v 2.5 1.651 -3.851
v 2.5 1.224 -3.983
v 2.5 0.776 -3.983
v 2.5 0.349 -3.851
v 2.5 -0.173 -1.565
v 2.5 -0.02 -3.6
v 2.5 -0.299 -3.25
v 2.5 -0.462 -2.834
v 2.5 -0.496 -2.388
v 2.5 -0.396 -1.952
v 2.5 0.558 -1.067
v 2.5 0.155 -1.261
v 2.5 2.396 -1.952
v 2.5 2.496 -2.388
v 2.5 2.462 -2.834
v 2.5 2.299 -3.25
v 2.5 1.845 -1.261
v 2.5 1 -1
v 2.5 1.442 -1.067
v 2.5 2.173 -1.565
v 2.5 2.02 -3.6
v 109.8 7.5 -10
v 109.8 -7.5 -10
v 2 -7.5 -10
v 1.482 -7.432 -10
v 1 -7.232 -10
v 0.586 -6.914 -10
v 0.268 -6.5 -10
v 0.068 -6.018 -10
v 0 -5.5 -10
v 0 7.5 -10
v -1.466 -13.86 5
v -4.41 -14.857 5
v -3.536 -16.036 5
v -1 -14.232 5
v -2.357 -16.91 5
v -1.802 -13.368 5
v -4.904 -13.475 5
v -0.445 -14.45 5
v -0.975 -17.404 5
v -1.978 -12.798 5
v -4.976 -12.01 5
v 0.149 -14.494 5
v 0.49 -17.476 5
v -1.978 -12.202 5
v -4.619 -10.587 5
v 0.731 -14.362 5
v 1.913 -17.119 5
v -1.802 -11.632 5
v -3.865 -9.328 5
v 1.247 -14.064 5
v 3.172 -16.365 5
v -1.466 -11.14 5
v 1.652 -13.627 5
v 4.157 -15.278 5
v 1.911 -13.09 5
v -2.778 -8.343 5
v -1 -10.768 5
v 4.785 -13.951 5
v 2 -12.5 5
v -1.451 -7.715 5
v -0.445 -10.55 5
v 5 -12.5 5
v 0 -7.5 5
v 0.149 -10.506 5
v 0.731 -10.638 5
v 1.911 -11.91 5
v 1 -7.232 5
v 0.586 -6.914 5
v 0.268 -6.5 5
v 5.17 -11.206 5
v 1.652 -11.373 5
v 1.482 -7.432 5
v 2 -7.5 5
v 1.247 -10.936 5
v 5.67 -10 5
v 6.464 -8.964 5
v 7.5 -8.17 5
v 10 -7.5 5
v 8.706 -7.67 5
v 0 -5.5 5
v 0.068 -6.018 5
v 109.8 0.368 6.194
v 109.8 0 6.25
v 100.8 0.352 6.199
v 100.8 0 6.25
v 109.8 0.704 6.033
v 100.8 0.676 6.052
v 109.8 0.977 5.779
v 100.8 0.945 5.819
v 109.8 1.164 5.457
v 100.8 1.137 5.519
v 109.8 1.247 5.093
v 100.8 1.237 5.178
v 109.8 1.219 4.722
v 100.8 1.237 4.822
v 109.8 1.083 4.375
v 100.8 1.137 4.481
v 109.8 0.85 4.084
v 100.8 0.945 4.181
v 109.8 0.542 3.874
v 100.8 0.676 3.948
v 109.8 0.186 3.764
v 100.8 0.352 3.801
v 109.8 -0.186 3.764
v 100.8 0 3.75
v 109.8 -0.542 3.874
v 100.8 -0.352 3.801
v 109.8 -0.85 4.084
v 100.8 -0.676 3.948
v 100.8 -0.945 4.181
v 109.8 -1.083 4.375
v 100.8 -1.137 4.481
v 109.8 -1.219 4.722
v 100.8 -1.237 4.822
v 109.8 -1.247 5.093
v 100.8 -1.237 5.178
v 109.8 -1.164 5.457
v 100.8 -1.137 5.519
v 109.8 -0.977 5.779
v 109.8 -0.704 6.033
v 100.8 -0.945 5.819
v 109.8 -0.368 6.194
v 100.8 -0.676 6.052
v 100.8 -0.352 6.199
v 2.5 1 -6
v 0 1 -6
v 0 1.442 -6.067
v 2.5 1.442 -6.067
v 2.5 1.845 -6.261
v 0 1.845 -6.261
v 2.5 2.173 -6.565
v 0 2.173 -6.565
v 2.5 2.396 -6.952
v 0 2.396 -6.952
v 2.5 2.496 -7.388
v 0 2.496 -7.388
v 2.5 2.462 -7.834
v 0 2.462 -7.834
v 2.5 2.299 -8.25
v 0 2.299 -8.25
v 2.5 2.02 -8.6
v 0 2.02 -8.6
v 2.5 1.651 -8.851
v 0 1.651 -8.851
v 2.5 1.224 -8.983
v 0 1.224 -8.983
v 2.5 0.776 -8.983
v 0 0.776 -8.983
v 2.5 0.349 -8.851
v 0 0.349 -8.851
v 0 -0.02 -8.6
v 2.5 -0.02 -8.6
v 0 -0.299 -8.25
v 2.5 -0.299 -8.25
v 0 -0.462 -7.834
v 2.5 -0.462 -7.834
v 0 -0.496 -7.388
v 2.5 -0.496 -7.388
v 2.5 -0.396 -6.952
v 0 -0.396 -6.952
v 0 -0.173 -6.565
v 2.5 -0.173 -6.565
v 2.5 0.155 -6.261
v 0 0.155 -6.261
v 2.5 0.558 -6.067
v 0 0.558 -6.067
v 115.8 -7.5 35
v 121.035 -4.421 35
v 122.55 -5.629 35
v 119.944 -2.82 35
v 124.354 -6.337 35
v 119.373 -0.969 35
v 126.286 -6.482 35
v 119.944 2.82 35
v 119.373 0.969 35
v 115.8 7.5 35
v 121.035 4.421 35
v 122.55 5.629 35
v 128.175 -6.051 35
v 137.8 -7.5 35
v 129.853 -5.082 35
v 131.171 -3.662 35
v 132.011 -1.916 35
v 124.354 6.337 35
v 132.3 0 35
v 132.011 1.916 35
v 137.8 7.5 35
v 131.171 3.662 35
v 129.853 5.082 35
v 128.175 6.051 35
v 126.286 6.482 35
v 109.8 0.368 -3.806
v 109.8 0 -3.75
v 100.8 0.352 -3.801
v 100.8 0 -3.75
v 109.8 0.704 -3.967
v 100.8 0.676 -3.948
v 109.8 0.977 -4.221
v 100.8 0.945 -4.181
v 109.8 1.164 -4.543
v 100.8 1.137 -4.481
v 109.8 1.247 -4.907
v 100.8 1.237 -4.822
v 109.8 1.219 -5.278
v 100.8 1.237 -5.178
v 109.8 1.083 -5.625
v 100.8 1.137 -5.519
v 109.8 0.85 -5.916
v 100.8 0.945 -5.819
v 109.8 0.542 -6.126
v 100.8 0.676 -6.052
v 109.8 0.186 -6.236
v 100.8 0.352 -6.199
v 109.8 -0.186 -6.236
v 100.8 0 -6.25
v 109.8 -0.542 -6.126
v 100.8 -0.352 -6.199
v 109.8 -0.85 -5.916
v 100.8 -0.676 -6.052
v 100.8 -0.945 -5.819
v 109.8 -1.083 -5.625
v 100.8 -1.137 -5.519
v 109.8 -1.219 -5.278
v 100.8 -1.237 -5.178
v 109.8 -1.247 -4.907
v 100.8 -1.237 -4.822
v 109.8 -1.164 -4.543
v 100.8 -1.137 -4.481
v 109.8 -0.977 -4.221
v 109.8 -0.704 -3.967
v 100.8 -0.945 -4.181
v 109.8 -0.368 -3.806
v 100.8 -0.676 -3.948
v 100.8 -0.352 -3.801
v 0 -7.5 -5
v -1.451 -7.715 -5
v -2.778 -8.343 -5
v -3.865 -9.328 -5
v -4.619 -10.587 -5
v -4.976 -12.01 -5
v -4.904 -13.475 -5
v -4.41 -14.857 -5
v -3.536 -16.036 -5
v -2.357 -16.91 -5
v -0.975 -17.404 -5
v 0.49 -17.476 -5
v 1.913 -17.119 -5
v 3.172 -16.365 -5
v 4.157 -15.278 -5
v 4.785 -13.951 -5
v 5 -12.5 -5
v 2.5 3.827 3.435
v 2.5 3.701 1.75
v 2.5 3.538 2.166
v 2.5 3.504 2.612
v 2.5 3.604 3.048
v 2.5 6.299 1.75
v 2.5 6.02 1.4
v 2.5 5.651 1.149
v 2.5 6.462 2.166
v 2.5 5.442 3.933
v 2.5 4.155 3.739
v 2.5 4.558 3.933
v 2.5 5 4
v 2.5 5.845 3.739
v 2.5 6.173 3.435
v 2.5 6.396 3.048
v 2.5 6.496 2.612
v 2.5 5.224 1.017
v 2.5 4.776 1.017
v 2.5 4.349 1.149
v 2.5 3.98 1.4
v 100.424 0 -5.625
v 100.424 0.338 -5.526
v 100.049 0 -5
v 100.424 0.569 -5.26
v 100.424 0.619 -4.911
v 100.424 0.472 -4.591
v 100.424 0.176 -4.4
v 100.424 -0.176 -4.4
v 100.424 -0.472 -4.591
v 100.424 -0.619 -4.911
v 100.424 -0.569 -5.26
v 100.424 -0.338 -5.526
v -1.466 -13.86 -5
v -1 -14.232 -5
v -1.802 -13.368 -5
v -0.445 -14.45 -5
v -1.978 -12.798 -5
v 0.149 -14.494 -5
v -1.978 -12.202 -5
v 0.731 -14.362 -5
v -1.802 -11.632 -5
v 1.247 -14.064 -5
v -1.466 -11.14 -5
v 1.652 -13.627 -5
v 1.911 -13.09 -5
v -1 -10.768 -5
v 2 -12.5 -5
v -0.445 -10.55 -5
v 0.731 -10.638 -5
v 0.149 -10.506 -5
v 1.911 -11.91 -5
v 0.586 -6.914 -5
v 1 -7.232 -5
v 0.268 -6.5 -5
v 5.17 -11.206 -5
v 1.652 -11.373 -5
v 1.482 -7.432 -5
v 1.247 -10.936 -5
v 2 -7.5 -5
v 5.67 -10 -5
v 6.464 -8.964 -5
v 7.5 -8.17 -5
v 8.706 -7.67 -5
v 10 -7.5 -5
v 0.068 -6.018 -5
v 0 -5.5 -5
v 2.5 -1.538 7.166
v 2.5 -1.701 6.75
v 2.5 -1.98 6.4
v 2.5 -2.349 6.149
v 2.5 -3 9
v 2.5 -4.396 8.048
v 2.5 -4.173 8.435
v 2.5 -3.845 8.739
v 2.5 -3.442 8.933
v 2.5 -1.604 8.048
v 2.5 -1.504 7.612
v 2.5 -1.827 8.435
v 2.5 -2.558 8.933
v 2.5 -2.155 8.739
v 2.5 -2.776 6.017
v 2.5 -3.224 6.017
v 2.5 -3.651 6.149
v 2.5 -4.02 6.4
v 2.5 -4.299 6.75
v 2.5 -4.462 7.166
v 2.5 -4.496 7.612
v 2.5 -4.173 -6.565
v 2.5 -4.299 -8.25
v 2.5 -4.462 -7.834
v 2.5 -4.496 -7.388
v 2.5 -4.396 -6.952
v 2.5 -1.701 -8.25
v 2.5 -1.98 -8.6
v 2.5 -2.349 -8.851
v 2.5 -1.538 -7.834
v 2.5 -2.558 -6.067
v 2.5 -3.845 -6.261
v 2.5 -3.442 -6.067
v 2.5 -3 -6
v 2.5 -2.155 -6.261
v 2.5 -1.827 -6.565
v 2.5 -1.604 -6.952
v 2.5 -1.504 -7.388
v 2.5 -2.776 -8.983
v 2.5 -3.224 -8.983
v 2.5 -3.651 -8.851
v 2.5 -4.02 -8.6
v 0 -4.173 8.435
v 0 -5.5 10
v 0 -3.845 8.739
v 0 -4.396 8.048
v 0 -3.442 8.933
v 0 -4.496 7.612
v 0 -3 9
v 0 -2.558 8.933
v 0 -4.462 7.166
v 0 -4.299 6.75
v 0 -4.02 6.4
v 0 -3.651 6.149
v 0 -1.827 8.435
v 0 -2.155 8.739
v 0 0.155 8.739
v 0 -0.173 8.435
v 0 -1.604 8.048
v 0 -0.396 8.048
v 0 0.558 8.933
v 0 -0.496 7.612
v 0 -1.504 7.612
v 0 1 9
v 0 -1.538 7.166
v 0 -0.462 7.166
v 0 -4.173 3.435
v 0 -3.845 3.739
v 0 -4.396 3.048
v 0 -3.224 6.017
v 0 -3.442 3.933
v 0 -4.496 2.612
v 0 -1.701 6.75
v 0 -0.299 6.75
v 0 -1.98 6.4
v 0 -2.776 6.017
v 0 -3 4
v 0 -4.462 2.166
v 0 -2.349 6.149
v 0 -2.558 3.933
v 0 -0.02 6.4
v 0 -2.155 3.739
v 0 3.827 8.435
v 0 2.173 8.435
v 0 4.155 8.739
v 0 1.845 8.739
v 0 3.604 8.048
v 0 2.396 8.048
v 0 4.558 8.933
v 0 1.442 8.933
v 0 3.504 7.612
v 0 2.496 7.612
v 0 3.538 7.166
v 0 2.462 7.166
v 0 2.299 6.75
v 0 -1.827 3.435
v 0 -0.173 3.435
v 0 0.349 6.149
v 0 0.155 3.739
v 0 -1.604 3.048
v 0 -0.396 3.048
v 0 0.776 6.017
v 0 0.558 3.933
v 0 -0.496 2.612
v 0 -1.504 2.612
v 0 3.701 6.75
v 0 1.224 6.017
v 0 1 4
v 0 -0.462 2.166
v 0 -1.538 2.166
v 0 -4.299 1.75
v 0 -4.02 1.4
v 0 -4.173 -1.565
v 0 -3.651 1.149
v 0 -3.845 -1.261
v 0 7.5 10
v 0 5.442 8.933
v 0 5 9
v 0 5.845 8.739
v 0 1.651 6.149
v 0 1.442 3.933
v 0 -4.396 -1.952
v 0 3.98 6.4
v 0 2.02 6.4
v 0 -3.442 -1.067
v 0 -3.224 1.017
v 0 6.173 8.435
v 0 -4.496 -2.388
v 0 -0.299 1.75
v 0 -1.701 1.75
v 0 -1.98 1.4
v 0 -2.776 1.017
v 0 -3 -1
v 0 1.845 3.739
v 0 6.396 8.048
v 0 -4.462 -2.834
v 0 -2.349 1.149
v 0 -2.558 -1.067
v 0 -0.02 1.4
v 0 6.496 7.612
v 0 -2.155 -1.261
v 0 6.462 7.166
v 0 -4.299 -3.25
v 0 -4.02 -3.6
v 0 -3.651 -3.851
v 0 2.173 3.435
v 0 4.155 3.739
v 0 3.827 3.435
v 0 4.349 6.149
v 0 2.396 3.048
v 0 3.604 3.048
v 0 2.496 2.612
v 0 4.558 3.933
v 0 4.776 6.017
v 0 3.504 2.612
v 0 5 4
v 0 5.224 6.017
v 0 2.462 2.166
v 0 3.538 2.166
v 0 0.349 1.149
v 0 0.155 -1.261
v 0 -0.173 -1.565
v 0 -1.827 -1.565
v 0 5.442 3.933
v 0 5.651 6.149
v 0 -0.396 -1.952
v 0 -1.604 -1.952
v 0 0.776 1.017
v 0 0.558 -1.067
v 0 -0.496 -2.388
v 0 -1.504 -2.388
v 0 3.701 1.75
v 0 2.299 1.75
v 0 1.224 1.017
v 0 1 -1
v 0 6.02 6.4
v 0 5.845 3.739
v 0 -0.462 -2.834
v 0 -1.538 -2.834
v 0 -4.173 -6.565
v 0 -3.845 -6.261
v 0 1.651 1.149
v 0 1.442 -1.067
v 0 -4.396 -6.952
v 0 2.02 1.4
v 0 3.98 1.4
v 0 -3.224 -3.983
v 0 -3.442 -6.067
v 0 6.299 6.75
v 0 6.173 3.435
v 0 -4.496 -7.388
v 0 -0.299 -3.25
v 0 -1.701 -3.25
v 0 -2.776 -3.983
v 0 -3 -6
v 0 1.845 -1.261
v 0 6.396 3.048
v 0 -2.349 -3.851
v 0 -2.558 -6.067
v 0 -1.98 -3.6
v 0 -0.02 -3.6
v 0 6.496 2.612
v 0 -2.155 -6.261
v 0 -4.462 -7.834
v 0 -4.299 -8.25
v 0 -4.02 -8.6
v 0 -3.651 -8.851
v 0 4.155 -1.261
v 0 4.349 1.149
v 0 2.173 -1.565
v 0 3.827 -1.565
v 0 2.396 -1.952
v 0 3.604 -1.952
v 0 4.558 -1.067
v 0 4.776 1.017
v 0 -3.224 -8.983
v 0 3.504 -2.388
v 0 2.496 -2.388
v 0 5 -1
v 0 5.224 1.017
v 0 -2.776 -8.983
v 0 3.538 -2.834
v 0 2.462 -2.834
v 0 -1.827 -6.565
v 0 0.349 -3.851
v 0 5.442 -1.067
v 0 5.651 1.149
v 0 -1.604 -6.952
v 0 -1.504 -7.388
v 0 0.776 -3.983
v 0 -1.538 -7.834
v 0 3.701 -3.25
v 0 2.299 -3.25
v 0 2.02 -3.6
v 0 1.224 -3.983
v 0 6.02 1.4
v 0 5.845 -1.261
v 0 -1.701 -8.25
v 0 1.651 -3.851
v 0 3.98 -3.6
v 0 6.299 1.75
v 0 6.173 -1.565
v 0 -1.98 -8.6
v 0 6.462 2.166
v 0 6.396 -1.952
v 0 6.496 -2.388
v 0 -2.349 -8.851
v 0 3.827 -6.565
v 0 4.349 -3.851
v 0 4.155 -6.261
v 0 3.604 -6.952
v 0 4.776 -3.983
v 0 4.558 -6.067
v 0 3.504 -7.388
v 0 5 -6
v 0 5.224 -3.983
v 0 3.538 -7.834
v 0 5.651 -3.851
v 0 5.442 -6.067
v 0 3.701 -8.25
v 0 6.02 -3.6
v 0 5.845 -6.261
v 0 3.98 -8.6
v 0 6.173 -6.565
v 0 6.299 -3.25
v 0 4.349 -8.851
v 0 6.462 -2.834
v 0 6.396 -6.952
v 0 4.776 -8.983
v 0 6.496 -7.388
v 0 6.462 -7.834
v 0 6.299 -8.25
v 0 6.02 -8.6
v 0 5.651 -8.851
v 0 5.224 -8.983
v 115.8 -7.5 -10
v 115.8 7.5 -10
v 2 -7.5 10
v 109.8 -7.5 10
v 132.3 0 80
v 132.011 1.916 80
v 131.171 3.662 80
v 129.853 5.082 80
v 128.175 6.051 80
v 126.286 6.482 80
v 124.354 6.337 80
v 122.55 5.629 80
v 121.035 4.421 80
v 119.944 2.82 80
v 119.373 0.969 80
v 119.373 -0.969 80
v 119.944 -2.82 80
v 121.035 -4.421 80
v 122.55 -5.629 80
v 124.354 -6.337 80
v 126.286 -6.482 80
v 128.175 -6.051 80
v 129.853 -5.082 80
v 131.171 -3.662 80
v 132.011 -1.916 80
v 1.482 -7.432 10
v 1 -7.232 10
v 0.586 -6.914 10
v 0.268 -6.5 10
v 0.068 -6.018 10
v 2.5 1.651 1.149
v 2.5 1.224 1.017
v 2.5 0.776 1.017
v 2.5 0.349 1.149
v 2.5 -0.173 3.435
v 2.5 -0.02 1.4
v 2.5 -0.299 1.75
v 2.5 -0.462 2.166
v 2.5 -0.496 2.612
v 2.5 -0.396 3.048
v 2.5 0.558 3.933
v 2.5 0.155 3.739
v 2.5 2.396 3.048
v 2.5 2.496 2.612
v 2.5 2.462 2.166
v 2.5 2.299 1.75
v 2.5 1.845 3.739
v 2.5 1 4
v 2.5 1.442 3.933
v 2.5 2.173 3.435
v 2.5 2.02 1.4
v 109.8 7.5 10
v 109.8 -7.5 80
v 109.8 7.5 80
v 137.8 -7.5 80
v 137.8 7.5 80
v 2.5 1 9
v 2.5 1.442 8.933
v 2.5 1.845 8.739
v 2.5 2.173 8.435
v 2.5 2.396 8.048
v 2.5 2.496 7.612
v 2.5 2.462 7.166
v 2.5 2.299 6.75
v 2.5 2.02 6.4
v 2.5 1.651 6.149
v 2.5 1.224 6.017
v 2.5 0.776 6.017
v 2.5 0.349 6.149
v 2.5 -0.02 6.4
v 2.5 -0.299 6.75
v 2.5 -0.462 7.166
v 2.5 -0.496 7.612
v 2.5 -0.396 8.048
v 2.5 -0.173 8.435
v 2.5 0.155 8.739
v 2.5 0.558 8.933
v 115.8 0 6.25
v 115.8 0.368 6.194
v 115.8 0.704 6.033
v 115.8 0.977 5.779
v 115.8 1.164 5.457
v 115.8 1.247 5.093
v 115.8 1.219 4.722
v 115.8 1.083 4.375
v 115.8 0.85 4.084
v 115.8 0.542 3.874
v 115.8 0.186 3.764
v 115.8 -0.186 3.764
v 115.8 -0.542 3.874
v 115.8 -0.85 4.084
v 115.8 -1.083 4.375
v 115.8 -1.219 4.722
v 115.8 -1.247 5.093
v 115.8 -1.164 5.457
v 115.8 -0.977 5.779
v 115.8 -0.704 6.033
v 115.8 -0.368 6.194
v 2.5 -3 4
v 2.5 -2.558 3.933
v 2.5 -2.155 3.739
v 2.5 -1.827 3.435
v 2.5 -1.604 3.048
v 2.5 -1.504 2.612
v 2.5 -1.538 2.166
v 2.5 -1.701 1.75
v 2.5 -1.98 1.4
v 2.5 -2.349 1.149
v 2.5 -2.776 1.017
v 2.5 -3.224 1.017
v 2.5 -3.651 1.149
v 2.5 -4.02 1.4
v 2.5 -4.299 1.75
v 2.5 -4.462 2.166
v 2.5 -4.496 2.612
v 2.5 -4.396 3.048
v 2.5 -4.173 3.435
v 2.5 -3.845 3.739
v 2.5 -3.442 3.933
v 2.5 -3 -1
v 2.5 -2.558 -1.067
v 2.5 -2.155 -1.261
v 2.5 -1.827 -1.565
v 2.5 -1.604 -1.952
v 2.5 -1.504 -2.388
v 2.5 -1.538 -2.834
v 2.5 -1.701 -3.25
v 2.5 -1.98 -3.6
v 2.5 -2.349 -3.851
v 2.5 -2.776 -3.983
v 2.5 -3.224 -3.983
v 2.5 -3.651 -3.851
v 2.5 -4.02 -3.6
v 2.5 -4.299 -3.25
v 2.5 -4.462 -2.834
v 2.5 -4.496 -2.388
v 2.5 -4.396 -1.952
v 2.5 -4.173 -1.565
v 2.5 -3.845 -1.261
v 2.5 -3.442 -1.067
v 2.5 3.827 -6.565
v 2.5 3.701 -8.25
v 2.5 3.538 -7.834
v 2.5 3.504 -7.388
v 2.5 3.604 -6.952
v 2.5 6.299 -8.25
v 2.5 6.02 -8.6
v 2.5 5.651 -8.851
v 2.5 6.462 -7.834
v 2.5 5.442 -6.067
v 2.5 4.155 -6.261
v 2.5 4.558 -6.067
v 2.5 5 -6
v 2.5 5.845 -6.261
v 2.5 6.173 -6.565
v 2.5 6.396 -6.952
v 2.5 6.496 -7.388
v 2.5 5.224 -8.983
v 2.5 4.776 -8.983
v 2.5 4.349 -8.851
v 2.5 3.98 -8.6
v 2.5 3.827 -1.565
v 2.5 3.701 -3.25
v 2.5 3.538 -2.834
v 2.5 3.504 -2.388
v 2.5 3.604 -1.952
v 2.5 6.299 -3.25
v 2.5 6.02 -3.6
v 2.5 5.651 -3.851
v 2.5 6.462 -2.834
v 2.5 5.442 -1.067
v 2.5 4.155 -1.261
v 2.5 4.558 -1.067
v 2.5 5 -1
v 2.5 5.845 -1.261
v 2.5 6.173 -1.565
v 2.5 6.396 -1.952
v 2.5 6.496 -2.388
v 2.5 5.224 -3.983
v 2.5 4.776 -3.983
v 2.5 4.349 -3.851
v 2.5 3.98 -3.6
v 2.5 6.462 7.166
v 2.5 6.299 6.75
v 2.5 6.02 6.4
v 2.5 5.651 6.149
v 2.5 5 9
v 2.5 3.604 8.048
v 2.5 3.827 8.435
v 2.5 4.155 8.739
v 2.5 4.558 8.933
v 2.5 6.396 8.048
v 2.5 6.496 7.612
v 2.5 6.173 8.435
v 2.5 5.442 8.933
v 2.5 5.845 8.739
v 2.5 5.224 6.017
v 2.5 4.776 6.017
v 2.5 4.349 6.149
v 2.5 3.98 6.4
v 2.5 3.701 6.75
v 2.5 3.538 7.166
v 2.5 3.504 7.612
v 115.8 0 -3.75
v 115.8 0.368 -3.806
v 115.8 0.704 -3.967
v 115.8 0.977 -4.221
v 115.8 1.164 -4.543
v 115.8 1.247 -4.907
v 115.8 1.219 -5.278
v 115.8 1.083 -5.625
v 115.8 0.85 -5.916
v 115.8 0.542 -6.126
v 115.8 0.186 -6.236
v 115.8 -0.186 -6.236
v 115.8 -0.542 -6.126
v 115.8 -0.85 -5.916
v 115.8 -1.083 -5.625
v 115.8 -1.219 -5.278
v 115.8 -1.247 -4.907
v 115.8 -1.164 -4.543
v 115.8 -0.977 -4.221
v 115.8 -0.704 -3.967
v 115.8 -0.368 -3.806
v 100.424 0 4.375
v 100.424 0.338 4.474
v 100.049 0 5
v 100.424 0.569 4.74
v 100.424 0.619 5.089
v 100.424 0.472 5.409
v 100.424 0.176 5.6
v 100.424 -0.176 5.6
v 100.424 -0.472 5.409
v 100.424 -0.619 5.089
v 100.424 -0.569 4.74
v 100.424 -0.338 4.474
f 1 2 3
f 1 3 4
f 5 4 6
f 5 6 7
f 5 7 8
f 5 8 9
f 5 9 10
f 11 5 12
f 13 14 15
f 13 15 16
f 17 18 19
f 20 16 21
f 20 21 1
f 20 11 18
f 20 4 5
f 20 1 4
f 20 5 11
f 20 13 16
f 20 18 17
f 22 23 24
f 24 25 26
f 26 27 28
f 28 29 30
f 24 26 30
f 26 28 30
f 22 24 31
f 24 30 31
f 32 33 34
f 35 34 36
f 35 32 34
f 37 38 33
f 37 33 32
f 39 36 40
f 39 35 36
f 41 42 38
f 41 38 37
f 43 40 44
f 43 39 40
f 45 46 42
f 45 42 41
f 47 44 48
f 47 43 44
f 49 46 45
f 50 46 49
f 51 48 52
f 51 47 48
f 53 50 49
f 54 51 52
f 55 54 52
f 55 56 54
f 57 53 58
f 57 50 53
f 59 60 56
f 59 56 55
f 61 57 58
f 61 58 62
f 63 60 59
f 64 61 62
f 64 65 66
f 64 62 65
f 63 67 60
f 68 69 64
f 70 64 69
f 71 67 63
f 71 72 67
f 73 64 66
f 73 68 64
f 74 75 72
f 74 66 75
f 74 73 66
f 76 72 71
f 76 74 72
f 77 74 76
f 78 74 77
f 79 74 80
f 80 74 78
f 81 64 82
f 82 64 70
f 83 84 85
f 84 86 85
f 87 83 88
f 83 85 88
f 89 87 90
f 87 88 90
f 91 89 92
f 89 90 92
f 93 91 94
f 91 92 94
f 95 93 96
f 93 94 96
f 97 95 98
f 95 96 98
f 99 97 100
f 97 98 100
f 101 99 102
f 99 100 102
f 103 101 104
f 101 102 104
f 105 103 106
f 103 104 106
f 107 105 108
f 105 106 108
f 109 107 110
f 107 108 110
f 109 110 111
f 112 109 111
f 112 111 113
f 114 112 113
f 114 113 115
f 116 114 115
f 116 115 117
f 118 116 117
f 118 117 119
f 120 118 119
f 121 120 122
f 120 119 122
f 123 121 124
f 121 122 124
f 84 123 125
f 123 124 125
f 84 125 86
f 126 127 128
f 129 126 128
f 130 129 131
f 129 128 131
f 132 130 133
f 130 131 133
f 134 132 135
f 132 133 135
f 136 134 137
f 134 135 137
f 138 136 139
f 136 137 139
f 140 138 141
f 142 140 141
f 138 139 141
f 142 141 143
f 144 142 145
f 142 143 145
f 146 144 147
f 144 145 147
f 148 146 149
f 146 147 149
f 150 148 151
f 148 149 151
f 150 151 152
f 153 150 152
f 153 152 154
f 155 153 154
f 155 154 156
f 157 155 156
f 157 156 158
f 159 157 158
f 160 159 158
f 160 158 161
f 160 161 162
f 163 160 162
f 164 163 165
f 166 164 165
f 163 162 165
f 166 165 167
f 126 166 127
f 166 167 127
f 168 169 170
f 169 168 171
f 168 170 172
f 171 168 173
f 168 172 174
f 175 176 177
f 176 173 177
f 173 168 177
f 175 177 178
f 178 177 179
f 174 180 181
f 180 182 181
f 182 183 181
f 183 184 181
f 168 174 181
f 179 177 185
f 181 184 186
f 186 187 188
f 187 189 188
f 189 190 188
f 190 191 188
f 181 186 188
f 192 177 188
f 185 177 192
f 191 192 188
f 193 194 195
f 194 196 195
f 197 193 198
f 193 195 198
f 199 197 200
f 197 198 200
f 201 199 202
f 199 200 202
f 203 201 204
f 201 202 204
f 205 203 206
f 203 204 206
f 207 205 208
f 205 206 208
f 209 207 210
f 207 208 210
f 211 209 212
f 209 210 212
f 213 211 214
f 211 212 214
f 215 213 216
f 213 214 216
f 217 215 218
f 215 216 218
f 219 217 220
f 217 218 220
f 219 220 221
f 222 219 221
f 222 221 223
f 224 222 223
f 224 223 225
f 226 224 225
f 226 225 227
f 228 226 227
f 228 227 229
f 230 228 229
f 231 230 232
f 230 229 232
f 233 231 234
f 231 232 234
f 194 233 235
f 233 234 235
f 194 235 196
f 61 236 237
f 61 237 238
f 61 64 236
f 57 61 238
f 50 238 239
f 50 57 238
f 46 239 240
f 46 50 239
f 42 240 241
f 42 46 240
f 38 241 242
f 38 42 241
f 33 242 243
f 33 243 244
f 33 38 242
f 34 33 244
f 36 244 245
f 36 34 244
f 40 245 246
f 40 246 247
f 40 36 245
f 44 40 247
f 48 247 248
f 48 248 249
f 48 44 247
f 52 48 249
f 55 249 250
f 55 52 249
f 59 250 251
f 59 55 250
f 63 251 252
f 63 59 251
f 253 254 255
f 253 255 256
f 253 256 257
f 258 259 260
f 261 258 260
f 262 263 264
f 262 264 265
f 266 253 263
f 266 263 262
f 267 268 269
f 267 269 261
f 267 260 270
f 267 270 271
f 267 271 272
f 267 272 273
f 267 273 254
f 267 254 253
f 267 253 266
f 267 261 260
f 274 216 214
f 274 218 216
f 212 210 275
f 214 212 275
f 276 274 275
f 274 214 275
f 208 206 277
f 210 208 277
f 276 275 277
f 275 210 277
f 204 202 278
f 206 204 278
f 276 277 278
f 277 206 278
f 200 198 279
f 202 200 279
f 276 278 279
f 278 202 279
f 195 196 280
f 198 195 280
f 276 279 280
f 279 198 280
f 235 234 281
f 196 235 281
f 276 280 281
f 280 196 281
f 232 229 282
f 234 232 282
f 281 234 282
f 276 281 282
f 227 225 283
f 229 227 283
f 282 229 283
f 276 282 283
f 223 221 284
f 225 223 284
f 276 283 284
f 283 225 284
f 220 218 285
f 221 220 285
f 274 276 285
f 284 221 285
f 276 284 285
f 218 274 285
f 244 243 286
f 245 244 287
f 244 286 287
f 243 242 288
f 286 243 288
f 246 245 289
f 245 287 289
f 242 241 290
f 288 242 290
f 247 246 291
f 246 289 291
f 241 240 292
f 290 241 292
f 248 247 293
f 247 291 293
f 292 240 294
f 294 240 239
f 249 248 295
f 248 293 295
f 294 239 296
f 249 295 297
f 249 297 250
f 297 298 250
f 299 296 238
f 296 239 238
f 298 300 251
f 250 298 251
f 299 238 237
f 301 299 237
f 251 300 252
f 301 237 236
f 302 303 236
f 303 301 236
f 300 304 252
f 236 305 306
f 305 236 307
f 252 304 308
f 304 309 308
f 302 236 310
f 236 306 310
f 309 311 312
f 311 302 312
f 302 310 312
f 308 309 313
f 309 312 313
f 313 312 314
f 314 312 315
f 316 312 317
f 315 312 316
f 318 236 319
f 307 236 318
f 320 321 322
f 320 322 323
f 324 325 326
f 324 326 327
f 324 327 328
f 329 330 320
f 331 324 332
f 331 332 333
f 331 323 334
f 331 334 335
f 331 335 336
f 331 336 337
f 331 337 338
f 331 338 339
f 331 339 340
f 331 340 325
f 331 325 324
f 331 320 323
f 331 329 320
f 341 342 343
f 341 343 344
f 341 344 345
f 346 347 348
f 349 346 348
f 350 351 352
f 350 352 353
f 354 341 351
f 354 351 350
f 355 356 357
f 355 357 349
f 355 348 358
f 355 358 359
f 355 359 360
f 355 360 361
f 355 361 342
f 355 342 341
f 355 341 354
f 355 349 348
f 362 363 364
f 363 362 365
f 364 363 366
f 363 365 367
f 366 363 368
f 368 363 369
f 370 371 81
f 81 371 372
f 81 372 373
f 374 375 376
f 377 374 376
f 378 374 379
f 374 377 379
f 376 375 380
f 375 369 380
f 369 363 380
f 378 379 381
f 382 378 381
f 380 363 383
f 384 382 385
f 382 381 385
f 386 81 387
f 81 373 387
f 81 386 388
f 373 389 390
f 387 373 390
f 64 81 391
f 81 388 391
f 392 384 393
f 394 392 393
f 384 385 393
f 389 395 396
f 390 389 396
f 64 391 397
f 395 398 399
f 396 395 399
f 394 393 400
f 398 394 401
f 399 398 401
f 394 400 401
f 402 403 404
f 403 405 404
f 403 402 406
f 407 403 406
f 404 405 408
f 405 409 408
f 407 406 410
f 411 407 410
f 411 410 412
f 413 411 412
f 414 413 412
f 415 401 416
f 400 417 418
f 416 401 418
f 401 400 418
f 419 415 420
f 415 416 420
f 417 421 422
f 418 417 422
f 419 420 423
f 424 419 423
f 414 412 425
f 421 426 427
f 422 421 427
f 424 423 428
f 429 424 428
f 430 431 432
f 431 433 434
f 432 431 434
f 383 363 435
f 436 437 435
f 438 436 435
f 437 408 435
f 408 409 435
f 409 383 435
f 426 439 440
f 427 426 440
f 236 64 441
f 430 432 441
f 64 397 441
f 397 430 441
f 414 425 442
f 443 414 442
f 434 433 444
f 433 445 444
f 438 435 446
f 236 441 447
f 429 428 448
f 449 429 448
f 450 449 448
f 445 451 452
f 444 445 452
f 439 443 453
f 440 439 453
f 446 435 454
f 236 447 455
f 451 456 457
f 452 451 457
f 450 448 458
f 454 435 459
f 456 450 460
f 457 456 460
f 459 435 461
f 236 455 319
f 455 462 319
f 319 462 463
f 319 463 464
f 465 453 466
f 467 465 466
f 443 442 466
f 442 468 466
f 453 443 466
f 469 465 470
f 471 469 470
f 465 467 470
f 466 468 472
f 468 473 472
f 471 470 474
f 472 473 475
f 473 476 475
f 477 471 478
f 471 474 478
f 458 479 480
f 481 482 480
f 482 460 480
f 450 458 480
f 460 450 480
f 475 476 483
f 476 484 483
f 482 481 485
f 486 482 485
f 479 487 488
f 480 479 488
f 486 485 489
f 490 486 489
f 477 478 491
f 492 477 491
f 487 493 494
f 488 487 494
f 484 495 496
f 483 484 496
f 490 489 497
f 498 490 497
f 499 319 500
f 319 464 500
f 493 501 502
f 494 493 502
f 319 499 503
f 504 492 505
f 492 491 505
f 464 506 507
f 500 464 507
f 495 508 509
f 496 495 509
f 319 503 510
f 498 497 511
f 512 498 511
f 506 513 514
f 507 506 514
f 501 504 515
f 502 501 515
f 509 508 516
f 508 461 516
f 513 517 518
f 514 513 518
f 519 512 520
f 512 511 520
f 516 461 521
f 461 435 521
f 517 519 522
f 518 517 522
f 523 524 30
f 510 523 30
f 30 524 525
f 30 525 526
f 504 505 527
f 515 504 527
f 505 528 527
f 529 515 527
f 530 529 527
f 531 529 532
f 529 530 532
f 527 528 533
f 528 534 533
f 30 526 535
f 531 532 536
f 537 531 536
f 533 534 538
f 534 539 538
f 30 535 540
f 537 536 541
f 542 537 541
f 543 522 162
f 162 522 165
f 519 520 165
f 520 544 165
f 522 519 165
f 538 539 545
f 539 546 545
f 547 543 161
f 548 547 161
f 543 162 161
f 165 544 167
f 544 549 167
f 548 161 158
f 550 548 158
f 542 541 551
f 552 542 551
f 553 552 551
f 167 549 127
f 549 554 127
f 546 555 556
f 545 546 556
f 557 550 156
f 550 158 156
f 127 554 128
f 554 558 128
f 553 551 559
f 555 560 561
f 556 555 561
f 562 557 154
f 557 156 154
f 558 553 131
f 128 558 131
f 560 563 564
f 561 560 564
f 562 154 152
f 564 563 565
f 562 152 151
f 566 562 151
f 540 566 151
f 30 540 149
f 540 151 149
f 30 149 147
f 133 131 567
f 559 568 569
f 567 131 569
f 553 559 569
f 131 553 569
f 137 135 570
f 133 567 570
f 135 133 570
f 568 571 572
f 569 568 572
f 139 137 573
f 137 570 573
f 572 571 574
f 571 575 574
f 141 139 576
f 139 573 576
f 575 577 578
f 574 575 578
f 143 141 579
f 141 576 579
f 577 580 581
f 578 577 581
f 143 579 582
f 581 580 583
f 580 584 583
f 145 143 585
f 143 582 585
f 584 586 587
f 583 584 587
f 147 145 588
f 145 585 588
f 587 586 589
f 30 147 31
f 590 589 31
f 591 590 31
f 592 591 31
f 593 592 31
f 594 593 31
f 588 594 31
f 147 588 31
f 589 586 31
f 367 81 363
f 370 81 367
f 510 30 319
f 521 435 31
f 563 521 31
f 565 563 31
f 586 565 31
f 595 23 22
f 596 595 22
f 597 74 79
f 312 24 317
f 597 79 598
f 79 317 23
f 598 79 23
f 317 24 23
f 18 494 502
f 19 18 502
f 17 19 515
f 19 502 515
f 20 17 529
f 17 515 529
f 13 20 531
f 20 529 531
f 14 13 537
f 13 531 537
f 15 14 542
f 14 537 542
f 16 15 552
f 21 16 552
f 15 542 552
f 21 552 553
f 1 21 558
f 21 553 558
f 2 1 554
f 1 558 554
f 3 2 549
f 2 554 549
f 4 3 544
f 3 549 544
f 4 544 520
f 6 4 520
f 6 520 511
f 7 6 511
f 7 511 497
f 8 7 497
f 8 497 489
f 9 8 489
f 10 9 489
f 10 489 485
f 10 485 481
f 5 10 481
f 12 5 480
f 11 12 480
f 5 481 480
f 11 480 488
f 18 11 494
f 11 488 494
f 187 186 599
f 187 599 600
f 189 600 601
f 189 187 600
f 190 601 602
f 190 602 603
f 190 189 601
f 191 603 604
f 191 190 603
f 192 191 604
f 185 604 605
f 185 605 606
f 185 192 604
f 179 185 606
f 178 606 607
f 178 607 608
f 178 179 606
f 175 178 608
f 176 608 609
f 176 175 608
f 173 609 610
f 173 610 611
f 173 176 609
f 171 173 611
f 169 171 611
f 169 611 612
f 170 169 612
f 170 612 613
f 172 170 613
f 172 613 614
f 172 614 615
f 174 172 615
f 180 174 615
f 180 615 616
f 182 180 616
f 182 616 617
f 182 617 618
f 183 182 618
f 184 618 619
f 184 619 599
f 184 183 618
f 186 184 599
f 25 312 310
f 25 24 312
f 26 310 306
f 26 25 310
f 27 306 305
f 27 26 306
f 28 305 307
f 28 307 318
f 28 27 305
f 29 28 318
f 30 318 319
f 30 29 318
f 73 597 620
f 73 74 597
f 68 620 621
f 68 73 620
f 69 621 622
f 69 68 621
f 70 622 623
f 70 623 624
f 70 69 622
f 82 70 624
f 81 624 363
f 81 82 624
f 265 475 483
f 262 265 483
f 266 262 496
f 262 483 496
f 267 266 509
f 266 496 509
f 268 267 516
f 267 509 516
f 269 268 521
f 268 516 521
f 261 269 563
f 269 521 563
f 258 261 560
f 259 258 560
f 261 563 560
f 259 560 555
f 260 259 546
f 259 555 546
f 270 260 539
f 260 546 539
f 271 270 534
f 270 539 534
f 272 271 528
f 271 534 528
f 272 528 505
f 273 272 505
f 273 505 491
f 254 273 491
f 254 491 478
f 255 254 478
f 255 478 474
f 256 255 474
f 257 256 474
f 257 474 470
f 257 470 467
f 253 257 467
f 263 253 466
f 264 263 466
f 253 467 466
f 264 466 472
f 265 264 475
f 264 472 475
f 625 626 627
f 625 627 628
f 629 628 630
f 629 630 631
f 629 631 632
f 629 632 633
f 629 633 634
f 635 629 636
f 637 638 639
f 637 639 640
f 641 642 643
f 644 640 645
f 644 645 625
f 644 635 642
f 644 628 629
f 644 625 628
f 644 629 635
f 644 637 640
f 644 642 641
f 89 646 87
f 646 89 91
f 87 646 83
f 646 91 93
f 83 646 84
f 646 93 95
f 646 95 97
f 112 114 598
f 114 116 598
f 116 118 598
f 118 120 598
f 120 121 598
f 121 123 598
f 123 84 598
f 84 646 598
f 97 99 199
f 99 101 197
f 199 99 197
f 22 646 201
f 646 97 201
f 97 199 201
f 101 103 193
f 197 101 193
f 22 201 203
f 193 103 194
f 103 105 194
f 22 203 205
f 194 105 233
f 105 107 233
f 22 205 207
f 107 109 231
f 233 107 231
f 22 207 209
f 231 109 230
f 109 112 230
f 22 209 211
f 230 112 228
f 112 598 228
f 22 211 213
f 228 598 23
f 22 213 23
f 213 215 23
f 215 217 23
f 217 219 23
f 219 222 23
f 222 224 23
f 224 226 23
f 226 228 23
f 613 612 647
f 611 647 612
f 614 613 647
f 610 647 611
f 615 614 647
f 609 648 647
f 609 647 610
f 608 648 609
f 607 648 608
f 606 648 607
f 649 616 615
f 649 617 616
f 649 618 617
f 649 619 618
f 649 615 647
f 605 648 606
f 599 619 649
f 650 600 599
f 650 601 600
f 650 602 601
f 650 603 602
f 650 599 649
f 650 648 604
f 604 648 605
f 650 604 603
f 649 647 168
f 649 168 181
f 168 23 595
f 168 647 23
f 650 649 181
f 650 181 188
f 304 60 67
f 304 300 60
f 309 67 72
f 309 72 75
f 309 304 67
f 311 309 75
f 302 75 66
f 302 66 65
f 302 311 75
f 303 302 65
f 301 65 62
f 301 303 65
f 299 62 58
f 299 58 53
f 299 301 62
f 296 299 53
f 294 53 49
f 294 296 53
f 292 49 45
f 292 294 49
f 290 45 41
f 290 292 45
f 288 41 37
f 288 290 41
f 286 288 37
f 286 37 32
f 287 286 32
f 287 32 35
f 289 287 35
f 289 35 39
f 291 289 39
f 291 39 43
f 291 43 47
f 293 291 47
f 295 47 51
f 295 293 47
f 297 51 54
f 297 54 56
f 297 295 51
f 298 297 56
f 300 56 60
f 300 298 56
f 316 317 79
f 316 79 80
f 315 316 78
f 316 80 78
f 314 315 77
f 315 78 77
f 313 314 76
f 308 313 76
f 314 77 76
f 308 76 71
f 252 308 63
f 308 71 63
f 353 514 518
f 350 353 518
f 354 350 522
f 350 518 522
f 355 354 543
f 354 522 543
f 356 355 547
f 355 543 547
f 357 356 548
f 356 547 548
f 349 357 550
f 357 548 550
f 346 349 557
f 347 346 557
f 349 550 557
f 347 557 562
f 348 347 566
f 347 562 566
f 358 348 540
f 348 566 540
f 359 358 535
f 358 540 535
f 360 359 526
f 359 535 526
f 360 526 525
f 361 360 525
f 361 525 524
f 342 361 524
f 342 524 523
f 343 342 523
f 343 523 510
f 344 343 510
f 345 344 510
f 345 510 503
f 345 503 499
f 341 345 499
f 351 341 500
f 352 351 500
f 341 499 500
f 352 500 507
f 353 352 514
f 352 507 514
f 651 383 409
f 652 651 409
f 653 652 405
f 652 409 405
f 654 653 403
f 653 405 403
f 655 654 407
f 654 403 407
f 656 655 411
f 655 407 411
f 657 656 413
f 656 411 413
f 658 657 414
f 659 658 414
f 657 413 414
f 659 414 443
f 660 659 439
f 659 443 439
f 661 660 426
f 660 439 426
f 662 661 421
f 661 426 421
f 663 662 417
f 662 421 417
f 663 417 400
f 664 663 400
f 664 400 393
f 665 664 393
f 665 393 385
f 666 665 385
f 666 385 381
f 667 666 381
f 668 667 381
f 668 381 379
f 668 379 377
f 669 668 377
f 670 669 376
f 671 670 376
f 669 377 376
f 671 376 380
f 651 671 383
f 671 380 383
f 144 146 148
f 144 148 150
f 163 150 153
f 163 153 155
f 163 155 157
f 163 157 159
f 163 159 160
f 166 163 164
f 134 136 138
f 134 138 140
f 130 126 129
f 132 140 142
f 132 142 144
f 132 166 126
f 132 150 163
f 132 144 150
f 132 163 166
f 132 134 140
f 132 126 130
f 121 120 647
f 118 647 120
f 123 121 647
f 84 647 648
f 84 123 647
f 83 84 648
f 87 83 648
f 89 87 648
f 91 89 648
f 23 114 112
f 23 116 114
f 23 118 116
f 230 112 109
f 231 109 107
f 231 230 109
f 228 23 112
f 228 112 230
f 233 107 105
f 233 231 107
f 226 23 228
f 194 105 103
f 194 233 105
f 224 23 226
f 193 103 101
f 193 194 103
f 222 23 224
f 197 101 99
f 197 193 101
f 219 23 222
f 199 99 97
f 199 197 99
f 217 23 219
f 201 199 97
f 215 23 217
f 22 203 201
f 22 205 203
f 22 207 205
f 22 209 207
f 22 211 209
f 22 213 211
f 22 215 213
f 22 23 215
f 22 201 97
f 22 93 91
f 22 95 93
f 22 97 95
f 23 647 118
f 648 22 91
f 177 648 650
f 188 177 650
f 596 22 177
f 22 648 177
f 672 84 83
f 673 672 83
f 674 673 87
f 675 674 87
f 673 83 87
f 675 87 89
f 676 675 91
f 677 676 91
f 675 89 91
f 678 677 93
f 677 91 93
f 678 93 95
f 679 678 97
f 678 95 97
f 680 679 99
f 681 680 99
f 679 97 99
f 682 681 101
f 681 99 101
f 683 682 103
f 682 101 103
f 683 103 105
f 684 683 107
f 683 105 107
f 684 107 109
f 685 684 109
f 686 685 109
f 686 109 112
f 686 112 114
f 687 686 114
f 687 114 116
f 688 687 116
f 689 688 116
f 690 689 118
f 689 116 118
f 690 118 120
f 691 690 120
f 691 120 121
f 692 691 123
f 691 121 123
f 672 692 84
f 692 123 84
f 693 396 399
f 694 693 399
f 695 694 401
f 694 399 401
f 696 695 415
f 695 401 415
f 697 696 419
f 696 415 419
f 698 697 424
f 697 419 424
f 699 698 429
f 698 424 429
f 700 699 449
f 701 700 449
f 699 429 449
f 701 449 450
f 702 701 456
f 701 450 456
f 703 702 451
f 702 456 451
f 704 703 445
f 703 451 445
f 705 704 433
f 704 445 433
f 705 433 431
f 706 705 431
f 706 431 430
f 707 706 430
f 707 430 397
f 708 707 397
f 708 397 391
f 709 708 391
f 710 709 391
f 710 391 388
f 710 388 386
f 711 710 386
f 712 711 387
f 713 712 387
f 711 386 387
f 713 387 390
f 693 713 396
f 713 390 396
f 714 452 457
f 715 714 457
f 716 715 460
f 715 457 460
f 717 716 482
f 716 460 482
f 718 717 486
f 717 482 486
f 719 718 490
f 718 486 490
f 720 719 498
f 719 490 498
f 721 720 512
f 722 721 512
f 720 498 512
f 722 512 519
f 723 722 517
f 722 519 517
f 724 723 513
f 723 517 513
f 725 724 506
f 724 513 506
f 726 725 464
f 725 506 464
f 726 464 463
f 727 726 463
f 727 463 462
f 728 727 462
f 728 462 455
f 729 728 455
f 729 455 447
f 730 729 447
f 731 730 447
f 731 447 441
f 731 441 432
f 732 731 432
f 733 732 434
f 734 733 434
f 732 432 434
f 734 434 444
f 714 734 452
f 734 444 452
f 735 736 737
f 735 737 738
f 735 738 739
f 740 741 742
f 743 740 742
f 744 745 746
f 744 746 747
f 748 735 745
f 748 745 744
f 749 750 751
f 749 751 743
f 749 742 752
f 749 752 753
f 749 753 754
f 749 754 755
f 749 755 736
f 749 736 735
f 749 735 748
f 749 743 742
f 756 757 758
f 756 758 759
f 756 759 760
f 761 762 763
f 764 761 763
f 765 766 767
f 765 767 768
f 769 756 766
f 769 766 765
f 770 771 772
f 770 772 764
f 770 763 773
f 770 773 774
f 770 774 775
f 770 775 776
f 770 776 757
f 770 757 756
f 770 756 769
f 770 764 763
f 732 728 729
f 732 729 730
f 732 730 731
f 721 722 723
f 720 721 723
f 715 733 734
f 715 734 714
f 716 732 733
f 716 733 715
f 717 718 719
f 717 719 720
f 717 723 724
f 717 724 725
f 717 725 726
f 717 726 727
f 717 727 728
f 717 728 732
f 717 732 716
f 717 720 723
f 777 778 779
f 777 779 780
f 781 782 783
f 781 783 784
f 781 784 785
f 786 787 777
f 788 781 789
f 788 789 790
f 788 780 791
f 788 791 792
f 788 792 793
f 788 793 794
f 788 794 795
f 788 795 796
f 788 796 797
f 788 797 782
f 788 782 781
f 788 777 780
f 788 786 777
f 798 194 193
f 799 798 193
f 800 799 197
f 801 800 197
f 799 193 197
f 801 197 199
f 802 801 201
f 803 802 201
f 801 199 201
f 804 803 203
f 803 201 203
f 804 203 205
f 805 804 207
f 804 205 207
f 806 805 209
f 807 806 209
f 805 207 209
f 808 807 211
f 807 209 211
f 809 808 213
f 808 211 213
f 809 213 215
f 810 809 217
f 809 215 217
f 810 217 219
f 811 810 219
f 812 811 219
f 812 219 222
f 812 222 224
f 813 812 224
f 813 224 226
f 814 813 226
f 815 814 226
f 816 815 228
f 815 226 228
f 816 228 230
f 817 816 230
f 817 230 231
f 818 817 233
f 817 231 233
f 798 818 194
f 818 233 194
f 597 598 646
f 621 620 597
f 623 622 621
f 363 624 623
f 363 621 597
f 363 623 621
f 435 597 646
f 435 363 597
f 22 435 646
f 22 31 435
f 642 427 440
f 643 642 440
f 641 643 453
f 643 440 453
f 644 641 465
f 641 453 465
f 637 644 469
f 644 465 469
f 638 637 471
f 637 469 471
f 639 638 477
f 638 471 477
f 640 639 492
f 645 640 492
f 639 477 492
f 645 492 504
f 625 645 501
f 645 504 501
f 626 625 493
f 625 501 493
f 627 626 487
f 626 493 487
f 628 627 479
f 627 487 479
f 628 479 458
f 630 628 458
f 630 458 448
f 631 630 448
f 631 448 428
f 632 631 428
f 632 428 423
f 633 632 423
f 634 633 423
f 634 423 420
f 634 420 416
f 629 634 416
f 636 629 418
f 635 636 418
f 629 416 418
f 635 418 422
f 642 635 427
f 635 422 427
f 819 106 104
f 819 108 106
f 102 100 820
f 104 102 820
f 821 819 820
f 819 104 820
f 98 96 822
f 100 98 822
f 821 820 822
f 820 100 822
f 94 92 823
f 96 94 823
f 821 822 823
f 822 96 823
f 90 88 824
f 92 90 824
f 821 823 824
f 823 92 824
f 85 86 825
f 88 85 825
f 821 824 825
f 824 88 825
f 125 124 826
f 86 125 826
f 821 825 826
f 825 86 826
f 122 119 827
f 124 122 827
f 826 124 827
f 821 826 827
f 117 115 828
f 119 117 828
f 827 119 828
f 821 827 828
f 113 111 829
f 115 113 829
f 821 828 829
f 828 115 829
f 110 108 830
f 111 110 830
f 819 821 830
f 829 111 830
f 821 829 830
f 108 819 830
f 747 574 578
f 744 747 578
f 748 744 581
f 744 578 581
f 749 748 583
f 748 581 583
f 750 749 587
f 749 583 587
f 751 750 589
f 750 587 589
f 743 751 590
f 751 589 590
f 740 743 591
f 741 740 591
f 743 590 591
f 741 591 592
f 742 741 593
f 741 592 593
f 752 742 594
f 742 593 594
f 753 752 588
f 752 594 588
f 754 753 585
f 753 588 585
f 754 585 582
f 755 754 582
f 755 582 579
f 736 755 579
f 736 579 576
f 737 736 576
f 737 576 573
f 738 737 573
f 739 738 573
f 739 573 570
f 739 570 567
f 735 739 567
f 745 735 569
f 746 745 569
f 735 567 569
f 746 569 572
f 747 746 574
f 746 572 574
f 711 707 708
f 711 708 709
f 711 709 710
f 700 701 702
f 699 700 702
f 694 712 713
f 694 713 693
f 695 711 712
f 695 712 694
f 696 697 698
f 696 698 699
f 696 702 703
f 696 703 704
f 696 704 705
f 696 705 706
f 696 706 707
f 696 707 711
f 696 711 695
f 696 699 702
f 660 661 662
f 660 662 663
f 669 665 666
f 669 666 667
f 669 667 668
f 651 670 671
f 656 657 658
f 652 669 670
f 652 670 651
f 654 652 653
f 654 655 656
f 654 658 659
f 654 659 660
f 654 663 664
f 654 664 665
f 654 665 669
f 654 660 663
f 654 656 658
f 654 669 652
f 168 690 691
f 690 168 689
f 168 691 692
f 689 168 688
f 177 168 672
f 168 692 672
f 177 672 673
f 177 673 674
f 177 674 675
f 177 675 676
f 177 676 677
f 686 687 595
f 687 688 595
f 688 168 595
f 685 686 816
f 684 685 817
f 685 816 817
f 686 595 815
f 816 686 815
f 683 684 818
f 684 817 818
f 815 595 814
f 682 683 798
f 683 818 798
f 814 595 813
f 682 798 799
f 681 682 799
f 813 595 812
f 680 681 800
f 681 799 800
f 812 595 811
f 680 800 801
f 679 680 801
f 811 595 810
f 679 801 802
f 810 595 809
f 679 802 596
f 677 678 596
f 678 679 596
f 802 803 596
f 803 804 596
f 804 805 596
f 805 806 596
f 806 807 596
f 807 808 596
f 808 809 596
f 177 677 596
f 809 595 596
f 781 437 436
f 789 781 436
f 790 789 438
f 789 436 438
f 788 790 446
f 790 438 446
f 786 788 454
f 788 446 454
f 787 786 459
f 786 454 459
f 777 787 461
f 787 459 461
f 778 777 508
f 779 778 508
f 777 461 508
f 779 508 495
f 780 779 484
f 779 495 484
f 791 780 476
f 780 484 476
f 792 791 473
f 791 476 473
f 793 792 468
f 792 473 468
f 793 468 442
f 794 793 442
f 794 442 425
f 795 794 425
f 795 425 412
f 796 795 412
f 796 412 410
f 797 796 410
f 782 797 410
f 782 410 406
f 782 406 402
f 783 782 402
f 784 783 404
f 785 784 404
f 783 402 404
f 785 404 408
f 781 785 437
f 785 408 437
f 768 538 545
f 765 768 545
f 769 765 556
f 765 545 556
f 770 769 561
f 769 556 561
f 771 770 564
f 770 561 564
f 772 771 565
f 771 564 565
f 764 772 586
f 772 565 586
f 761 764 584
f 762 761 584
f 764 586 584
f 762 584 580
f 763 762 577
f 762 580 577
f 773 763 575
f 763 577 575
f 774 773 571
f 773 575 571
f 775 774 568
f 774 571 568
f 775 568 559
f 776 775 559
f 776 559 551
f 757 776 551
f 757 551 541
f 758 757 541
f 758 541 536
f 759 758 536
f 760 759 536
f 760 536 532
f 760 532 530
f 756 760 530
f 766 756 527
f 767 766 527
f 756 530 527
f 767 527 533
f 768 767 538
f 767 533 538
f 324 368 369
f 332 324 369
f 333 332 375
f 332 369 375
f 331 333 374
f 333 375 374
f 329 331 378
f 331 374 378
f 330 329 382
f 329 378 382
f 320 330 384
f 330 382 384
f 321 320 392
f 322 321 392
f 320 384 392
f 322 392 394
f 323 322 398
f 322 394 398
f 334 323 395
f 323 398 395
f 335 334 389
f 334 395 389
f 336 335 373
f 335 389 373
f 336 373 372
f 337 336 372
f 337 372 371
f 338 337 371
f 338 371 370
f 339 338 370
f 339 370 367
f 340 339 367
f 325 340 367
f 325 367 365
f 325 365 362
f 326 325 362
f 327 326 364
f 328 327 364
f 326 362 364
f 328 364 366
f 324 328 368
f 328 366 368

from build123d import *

# Parameters (mm, degrees)
SKETCH4_W                 = 20
SKETCH4_H                 = 15
BOSS_EXTRUDE1_DEPTH       = 115.8
SKETCH5_W                 = 6
SKETCH5_H                 = 15
BOSS_EXTRUDE2_DEPTH       = 35
BOSS_EXTRUDE3_DEPTH       = 35
BOSS_EXTRUDE3_DEPTH_BACK  = 10
SKETCH6_W                 = 28
SKETCH6_H                 = 15
SKETCH6_R                 = 6.5
SKETCH7_R                 = 2
BOSS_EXTRUDE4_DEPTH       = 5
FILLET1_R                 = 2
FILLET2_R                 = 5
M3X0_5_TAPPED_HOLE2_D     = 2.5
M3X0_5_TAPPED_HOLE2_DEPTH = 15
M3X0_5_TAPPED_HOLE2_TIP   = 0.751075774
SKETCH19_R                = 1.5
CUT_EXTRUDE3_DEPTH        = 2.5
SPLIT2_SURFACE_1_BACK     = 171.637
SPLIT2_SURFACE_1_DEPTH    = 343.274
SPLIT2_SURFACE_2_BACK     = 171.637
SPLIT2_SURFACE_2_DEPTH    = 343.274


with BuildPart() as part:
    # Sketch4 → Boss-Extrude1 (new body)
    with BuildSketch(Plane(origin=(0, 0, 0), x_dir=(0, 0, -1), z_dir=(1, 0, 0))):
        Rectangle(SKETCH4_W, SKETCH4_H)
    extrude(amount=BOSS_EXTRUDE1_DEPTH)

    # Sketch5 → Boss-Extrude2 (add)
    with BuildSketch(Plane.XY.offset(10)):
        with Locations((112.8, 0)):
            Rectangle(SKETCH5_W, SKETCH5_H)
    extrude(amount=BOSS_EXTRUDE2_DEPTH)

    # Sketch6 → Boss-Extrude3 (add, two sides: drawn at the far end of the back side and taken through both)
    with BuildSketch(Plane.XY.offset(45).offset(-BOSS_EXTRUDE3_DEPTH_BACK)):
        with Locations((123.8, 0)):
            Rectangle(SKETCH6_W, SKETCH6_H)
        with Locations((125.8, 0)):
            Circle(SKETCH6_R, mode=Mode.SUBTRACT)
    extrude(amount=BOSS_EXTRUDE3_DEPTH + BOSS_EXTRUDE3_DEPTH_BACK)

    # Sketch7 → Boss-Extrude4 (add, symmetric)
    with BuildSketch(Plane.XY):
        with BuildLine():
            Line((5, -12.5), (5, -7.5))
            Line((5, -7.5), (0, -7.5))
            ThreePointArc((0, -7.5), (-3.535533906, -16.035533906), (5, -12.5))
        make_face()
        with Locations((0, -12.5)):
            Circle(SKETCH7_R, mode=Mode.SUBTRACT)
    extrude(amount=BOSS_EXTRUDE4_DEPTH, both=True)

    # Fillet1
    fillet1_edges = [part.edges().sort_by_distance(p)[0] for p in [
        (0, -7.5, 7.5),
        (0, -7.5, -7.5),
    ]]
    fillet(fillet1_edges, radius=FILLET1_R)

    # Fillet2
    fillet2_edges = [part.edges().sort_by_distance(p)[0] for p in [
        (5, -7.5, 0),
    ]]
    fillet(fillet2_edges, radius=FILLET2_R - 0.0001)  # a hair under: the kernel refuses the full size

    # M3x0.5 Tapped Hole2
    with Locations(Plane(origin=(115.8, 0, 0), x_dir=(0, 0, -1), z_dir=(1, 0, 0))):
        with Locations((5, 0), (-5, 0)):
            Hole(M3X0_5_TAPPED_HOLE2_D / 2, depth=M3X0_5_TAPPED_HOLE2_DEPTH)
            with Locations((0, 0, -(M3X0_5_TAPPED_HOLE2_DEPTH + M3X0_5_TAPPED_HOLE2_TIP / 2))):  # 118° drill point
                Cone(0, M3X0_5_TAPPED_HOLE2_D / 2, M3X0_5_TAPPED_HOLE2_TIP, mode=Mode.SUBTRACT)

    # Sketch19 → Cut-Extrude3 (cut)
    with BuildSketch(Plane.ZY):
        with Locations((-7.5, 5)):
            Circle(SKETCH19_R)
        with Locations((-2.5, 5)):
            Circle(SKETCH19_R)
        with Locations((2.5, 5)):
            Circle(SKETCH19_R)
        with Locations((7.5, 5)):
            Circle(SKETCH19_R)
        with Locations((-2.5, 1)):
            Circle(SKETCH19_R)
        with Locations((2.5, 1)):
            Circle(SKETCH19_R)
        with Locations((7.5, 1)):
            Circle(SKETCH19_R)
        with Locations((-2.5, -3)):
            Circle(SKETCH19_R)
        with Locations((2.5, -3)):
            Circle(SKETCH19_R)
        with Locations((7.5, -3)):
            Circle(SKETCH19_R)
        with Locations((-7.5, 1)):
            Circle(SKETCH19_R)
        with Locations((-7.5, -3)):
            Circle(SKETCH19_R)
    extrude(amount=-CUT_EXTRUDE3_DEPTH, mode=Mode.SUBTRACT)


with BuildPart() as body_2:
    # Split2: the piece behind the surface
    add(part.part)
    # Split2 surface: a surface, the sketch's curves swept straight by 343.274 mm
    with BuildLine(Plane(origin=(0, 7.5, 0), x_dir=(1, 0, 0), z_dir=(0, 1, 0)).offset(-SPLIT2_SURFACE_1_BACK), mode=Mode.PRIVATE) as split2_surface_1_path:
        Line((109.8, -10), (109.8, 10))
    split2_surface_1 = Shell.extrude(split2_surface_1_path.wire(), (0 * SPLIT2_SURFACE_1_DEPTH, 1 * SPLIT2_SURFACE_1_DEPTH, 0 * SPLIT2_SURFACE_1_DEPTH))
    split(bisect_by=split2_surface_1, keep=Keep.BOTTOM)


with BuildPart() as part_1:
    add(part.part)

    # Split2: split by a surface, the side it looks to stays
    # Split2 surface: a surface, the sketch's curves swept straight by 343.274 mm
    with BuildLine(Plane(origin=(0, 7.5, 0), x_dir=(1, 0, 0), z_dir=(0, 1, 0)).offset(-SPLIT2_SURFACE_2_BACK), mode=Mode.PRIVATE) as split2_surface_2_path:
        Line((109.8, -10), (109.8, 10))
    split2_surface_2 = Shell.extrude(split2_surface_2_path.wire(), (0 * SPLIT2_SURFACE_2_DEPTH, 1 * SPLIT2_SURFACE_2_DEPTH, 0 * SPLIT2_SURFACE_2_DEPTH))
    split(bisect_by=split2_surface_2, keep=Keep.TOP)


solid = Compound([body_2.part, part_1.part])
